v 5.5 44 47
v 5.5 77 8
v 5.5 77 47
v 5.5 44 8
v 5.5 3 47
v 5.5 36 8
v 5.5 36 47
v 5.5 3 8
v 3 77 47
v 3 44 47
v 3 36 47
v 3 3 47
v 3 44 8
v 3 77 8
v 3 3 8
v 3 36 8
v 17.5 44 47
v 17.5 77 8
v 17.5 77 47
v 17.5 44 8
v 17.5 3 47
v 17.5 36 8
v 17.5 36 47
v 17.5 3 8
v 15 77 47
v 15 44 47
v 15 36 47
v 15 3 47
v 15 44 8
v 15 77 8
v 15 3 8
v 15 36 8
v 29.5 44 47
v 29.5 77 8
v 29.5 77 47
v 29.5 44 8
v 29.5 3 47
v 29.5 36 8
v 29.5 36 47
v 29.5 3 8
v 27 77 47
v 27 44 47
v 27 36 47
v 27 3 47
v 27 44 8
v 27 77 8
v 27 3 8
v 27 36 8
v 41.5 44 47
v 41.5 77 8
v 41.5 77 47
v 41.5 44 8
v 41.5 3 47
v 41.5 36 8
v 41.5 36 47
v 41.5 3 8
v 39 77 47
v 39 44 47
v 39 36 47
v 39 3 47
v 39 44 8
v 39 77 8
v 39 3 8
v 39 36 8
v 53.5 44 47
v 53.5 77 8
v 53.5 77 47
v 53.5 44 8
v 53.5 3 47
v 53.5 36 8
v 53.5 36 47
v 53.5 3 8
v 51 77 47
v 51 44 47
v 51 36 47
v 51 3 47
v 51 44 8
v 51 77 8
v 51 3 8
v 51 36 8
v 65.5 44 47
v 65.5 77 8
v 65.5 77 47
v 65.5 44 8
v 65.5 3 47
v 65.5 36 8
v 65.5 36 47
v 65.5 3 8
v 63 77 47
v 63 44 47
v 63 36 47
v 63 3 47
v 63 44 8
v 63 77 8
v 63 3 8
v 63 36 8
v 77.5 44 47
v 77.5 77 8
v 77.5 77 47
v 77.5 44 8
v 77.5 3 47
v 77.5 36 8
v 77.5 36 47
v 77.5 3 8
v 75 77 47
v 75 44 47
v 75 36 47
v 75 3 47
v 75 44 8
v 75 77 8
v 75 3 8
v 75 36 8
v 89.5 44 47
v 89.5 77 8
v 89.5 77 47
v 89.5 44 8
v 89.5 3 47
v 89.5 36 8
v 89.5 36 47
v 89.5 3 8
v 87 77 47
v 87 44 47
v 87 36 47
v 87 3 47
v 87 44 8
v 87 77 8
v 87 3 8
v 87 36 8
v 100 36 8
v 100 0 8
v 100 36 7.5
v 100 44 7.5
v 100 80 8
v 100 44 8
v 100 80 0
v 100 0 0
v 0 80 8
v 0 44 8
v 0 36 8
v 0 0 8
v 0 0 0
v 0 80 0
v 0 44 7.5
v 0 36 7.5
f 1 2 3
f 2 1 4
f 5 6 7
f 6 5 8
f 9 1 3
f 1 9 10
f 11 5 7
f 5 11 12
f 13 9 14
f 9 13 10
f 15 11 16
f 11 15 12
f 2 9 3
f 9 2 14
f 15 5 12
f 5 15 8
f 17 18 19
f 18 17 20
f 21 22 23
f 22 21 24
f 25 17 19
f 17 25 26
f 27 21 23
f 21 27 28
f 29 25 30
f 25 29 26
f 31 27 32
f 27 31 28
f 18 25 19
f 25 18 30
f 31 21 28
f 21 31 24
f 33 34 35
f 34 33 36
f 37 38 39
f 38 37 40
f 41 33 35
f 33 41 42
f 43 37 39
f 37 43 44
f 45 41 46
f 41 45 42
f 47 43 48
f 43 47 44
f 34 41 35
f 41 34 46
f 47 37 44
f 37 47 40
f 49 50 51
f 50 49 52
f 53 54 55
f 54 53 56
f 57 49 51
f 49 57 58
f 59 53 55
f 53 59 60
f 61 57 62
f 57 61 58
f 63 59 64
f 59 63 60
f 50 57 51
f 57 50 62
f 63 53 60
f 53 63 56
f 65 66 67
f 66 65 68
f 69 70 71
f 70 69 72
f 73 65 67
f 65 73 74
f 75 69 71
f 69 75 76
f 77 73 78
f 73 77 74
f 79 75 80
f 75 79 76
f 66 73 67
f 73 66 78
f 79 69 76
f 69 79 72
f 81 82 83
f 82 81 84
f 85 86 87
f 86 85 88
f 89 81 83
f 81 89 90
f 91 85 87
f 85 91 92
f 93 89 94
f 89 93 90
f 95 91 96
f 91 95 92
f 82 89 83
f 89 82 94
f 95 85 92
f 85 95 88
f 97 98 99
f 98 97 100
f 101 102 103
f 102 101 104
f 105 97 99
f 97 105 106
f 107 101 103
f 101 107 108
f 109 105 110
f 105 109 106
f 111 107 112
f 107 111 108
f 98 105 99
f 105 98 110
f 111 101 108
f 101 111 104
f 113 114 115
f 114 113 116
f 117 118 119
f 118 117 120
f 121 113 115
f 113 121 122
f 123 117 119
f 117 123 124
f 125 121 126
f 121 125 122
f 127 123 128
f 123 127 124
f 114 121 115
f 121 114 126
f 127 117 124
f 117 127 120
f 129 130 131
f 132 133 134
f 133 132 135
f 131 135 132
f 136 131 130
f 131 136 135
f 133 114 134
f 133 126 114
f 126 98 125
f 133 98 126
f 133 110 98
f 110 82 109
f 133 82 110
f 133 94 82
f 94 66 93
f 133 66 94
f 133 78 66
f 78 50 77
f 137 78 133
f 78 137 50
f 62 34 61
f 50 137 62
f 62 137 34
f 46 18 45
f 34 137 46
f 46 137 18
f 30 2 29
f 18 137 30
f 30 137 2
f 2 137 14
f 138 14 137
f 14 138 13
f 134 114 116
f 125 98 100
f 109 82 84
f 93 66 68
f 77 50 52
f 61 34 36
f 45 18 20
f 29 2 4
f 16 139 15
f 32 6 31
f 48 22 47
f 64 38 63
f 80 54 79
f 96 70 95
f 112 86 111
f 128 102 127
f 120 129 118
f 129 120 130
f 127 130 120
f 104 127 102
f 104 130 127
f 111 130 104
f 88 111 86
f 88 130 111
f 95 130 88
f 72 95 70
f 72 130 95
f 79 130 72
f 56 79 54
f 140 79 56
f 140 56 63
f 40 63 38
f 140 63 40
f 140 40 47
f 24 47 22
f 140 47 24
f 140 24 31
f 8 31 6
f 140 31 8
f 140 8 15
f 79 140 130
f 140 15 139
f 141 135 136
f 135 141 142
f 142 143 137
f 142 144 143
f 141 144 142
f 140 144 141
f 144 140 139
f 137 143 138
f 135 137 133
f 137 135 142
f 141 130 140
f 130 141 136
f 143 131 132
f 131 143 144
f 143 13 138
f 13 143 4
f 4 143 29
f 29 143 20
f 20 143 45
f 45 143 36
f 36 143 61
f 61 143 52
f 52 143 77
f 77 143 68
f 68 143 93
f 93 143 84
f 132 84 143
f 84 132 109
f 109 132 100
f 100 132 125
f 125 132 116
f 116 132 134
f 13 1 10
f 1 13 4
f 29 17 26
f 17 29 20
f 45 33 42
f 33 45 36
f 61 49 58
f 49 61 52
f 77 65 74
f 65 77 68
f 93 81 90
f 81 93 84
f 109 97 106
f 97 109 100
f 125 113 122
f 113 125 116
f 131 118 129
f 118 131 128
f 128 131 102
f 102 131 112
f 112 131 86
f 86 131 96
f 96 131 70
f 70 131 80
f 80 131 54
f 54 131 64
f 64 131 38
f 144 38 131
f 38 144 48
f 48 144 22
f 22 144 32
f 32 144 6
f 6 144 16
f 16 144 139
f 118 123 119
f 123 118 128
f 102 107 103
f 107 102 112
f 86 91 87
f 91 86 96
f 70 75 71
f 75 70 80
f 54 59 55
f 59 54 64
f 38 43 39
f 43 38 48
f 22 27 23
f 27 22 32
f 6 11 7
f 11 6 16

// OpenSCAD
$fn = 32;

// ----------------------------------------------------------------------
// Heatsink: slotted fin block
// ----------------------------------------------------------------------

// --- parameters (mm) ---
base_l = 100;             // base length, X
base_w = 80;              // base width, Y
base_t = 8;               // base plate thickness
fin_h = 40;               // fin height above the base
fin_t = 2.5;              // fin thickness
edge = 3;                 // margin from the base ends
pitch = 12;               // fin pitch
slot_w = 8;               // central slot width, Y

n_fins = floor((base_l - 2 * edge - fin_t) / pitch) + 1;  // fin count
total_h = base_t + fin_h - 1;  // overall height

difference() {
union() {
  cube([base_l, base_w, base_t]);
  for (i = [0 : n_fins - 1])
    translate([edge + i * pitch, edge, base_t - 1])
      cube([fin_t, base_w - 2 * edge, fin_h]);
}
  translate([-1, base_w / 2 - slot_w / 2, base_t - 0.5])
    cube([base_l + 2, slot_w, fin_h + 2]);
}
